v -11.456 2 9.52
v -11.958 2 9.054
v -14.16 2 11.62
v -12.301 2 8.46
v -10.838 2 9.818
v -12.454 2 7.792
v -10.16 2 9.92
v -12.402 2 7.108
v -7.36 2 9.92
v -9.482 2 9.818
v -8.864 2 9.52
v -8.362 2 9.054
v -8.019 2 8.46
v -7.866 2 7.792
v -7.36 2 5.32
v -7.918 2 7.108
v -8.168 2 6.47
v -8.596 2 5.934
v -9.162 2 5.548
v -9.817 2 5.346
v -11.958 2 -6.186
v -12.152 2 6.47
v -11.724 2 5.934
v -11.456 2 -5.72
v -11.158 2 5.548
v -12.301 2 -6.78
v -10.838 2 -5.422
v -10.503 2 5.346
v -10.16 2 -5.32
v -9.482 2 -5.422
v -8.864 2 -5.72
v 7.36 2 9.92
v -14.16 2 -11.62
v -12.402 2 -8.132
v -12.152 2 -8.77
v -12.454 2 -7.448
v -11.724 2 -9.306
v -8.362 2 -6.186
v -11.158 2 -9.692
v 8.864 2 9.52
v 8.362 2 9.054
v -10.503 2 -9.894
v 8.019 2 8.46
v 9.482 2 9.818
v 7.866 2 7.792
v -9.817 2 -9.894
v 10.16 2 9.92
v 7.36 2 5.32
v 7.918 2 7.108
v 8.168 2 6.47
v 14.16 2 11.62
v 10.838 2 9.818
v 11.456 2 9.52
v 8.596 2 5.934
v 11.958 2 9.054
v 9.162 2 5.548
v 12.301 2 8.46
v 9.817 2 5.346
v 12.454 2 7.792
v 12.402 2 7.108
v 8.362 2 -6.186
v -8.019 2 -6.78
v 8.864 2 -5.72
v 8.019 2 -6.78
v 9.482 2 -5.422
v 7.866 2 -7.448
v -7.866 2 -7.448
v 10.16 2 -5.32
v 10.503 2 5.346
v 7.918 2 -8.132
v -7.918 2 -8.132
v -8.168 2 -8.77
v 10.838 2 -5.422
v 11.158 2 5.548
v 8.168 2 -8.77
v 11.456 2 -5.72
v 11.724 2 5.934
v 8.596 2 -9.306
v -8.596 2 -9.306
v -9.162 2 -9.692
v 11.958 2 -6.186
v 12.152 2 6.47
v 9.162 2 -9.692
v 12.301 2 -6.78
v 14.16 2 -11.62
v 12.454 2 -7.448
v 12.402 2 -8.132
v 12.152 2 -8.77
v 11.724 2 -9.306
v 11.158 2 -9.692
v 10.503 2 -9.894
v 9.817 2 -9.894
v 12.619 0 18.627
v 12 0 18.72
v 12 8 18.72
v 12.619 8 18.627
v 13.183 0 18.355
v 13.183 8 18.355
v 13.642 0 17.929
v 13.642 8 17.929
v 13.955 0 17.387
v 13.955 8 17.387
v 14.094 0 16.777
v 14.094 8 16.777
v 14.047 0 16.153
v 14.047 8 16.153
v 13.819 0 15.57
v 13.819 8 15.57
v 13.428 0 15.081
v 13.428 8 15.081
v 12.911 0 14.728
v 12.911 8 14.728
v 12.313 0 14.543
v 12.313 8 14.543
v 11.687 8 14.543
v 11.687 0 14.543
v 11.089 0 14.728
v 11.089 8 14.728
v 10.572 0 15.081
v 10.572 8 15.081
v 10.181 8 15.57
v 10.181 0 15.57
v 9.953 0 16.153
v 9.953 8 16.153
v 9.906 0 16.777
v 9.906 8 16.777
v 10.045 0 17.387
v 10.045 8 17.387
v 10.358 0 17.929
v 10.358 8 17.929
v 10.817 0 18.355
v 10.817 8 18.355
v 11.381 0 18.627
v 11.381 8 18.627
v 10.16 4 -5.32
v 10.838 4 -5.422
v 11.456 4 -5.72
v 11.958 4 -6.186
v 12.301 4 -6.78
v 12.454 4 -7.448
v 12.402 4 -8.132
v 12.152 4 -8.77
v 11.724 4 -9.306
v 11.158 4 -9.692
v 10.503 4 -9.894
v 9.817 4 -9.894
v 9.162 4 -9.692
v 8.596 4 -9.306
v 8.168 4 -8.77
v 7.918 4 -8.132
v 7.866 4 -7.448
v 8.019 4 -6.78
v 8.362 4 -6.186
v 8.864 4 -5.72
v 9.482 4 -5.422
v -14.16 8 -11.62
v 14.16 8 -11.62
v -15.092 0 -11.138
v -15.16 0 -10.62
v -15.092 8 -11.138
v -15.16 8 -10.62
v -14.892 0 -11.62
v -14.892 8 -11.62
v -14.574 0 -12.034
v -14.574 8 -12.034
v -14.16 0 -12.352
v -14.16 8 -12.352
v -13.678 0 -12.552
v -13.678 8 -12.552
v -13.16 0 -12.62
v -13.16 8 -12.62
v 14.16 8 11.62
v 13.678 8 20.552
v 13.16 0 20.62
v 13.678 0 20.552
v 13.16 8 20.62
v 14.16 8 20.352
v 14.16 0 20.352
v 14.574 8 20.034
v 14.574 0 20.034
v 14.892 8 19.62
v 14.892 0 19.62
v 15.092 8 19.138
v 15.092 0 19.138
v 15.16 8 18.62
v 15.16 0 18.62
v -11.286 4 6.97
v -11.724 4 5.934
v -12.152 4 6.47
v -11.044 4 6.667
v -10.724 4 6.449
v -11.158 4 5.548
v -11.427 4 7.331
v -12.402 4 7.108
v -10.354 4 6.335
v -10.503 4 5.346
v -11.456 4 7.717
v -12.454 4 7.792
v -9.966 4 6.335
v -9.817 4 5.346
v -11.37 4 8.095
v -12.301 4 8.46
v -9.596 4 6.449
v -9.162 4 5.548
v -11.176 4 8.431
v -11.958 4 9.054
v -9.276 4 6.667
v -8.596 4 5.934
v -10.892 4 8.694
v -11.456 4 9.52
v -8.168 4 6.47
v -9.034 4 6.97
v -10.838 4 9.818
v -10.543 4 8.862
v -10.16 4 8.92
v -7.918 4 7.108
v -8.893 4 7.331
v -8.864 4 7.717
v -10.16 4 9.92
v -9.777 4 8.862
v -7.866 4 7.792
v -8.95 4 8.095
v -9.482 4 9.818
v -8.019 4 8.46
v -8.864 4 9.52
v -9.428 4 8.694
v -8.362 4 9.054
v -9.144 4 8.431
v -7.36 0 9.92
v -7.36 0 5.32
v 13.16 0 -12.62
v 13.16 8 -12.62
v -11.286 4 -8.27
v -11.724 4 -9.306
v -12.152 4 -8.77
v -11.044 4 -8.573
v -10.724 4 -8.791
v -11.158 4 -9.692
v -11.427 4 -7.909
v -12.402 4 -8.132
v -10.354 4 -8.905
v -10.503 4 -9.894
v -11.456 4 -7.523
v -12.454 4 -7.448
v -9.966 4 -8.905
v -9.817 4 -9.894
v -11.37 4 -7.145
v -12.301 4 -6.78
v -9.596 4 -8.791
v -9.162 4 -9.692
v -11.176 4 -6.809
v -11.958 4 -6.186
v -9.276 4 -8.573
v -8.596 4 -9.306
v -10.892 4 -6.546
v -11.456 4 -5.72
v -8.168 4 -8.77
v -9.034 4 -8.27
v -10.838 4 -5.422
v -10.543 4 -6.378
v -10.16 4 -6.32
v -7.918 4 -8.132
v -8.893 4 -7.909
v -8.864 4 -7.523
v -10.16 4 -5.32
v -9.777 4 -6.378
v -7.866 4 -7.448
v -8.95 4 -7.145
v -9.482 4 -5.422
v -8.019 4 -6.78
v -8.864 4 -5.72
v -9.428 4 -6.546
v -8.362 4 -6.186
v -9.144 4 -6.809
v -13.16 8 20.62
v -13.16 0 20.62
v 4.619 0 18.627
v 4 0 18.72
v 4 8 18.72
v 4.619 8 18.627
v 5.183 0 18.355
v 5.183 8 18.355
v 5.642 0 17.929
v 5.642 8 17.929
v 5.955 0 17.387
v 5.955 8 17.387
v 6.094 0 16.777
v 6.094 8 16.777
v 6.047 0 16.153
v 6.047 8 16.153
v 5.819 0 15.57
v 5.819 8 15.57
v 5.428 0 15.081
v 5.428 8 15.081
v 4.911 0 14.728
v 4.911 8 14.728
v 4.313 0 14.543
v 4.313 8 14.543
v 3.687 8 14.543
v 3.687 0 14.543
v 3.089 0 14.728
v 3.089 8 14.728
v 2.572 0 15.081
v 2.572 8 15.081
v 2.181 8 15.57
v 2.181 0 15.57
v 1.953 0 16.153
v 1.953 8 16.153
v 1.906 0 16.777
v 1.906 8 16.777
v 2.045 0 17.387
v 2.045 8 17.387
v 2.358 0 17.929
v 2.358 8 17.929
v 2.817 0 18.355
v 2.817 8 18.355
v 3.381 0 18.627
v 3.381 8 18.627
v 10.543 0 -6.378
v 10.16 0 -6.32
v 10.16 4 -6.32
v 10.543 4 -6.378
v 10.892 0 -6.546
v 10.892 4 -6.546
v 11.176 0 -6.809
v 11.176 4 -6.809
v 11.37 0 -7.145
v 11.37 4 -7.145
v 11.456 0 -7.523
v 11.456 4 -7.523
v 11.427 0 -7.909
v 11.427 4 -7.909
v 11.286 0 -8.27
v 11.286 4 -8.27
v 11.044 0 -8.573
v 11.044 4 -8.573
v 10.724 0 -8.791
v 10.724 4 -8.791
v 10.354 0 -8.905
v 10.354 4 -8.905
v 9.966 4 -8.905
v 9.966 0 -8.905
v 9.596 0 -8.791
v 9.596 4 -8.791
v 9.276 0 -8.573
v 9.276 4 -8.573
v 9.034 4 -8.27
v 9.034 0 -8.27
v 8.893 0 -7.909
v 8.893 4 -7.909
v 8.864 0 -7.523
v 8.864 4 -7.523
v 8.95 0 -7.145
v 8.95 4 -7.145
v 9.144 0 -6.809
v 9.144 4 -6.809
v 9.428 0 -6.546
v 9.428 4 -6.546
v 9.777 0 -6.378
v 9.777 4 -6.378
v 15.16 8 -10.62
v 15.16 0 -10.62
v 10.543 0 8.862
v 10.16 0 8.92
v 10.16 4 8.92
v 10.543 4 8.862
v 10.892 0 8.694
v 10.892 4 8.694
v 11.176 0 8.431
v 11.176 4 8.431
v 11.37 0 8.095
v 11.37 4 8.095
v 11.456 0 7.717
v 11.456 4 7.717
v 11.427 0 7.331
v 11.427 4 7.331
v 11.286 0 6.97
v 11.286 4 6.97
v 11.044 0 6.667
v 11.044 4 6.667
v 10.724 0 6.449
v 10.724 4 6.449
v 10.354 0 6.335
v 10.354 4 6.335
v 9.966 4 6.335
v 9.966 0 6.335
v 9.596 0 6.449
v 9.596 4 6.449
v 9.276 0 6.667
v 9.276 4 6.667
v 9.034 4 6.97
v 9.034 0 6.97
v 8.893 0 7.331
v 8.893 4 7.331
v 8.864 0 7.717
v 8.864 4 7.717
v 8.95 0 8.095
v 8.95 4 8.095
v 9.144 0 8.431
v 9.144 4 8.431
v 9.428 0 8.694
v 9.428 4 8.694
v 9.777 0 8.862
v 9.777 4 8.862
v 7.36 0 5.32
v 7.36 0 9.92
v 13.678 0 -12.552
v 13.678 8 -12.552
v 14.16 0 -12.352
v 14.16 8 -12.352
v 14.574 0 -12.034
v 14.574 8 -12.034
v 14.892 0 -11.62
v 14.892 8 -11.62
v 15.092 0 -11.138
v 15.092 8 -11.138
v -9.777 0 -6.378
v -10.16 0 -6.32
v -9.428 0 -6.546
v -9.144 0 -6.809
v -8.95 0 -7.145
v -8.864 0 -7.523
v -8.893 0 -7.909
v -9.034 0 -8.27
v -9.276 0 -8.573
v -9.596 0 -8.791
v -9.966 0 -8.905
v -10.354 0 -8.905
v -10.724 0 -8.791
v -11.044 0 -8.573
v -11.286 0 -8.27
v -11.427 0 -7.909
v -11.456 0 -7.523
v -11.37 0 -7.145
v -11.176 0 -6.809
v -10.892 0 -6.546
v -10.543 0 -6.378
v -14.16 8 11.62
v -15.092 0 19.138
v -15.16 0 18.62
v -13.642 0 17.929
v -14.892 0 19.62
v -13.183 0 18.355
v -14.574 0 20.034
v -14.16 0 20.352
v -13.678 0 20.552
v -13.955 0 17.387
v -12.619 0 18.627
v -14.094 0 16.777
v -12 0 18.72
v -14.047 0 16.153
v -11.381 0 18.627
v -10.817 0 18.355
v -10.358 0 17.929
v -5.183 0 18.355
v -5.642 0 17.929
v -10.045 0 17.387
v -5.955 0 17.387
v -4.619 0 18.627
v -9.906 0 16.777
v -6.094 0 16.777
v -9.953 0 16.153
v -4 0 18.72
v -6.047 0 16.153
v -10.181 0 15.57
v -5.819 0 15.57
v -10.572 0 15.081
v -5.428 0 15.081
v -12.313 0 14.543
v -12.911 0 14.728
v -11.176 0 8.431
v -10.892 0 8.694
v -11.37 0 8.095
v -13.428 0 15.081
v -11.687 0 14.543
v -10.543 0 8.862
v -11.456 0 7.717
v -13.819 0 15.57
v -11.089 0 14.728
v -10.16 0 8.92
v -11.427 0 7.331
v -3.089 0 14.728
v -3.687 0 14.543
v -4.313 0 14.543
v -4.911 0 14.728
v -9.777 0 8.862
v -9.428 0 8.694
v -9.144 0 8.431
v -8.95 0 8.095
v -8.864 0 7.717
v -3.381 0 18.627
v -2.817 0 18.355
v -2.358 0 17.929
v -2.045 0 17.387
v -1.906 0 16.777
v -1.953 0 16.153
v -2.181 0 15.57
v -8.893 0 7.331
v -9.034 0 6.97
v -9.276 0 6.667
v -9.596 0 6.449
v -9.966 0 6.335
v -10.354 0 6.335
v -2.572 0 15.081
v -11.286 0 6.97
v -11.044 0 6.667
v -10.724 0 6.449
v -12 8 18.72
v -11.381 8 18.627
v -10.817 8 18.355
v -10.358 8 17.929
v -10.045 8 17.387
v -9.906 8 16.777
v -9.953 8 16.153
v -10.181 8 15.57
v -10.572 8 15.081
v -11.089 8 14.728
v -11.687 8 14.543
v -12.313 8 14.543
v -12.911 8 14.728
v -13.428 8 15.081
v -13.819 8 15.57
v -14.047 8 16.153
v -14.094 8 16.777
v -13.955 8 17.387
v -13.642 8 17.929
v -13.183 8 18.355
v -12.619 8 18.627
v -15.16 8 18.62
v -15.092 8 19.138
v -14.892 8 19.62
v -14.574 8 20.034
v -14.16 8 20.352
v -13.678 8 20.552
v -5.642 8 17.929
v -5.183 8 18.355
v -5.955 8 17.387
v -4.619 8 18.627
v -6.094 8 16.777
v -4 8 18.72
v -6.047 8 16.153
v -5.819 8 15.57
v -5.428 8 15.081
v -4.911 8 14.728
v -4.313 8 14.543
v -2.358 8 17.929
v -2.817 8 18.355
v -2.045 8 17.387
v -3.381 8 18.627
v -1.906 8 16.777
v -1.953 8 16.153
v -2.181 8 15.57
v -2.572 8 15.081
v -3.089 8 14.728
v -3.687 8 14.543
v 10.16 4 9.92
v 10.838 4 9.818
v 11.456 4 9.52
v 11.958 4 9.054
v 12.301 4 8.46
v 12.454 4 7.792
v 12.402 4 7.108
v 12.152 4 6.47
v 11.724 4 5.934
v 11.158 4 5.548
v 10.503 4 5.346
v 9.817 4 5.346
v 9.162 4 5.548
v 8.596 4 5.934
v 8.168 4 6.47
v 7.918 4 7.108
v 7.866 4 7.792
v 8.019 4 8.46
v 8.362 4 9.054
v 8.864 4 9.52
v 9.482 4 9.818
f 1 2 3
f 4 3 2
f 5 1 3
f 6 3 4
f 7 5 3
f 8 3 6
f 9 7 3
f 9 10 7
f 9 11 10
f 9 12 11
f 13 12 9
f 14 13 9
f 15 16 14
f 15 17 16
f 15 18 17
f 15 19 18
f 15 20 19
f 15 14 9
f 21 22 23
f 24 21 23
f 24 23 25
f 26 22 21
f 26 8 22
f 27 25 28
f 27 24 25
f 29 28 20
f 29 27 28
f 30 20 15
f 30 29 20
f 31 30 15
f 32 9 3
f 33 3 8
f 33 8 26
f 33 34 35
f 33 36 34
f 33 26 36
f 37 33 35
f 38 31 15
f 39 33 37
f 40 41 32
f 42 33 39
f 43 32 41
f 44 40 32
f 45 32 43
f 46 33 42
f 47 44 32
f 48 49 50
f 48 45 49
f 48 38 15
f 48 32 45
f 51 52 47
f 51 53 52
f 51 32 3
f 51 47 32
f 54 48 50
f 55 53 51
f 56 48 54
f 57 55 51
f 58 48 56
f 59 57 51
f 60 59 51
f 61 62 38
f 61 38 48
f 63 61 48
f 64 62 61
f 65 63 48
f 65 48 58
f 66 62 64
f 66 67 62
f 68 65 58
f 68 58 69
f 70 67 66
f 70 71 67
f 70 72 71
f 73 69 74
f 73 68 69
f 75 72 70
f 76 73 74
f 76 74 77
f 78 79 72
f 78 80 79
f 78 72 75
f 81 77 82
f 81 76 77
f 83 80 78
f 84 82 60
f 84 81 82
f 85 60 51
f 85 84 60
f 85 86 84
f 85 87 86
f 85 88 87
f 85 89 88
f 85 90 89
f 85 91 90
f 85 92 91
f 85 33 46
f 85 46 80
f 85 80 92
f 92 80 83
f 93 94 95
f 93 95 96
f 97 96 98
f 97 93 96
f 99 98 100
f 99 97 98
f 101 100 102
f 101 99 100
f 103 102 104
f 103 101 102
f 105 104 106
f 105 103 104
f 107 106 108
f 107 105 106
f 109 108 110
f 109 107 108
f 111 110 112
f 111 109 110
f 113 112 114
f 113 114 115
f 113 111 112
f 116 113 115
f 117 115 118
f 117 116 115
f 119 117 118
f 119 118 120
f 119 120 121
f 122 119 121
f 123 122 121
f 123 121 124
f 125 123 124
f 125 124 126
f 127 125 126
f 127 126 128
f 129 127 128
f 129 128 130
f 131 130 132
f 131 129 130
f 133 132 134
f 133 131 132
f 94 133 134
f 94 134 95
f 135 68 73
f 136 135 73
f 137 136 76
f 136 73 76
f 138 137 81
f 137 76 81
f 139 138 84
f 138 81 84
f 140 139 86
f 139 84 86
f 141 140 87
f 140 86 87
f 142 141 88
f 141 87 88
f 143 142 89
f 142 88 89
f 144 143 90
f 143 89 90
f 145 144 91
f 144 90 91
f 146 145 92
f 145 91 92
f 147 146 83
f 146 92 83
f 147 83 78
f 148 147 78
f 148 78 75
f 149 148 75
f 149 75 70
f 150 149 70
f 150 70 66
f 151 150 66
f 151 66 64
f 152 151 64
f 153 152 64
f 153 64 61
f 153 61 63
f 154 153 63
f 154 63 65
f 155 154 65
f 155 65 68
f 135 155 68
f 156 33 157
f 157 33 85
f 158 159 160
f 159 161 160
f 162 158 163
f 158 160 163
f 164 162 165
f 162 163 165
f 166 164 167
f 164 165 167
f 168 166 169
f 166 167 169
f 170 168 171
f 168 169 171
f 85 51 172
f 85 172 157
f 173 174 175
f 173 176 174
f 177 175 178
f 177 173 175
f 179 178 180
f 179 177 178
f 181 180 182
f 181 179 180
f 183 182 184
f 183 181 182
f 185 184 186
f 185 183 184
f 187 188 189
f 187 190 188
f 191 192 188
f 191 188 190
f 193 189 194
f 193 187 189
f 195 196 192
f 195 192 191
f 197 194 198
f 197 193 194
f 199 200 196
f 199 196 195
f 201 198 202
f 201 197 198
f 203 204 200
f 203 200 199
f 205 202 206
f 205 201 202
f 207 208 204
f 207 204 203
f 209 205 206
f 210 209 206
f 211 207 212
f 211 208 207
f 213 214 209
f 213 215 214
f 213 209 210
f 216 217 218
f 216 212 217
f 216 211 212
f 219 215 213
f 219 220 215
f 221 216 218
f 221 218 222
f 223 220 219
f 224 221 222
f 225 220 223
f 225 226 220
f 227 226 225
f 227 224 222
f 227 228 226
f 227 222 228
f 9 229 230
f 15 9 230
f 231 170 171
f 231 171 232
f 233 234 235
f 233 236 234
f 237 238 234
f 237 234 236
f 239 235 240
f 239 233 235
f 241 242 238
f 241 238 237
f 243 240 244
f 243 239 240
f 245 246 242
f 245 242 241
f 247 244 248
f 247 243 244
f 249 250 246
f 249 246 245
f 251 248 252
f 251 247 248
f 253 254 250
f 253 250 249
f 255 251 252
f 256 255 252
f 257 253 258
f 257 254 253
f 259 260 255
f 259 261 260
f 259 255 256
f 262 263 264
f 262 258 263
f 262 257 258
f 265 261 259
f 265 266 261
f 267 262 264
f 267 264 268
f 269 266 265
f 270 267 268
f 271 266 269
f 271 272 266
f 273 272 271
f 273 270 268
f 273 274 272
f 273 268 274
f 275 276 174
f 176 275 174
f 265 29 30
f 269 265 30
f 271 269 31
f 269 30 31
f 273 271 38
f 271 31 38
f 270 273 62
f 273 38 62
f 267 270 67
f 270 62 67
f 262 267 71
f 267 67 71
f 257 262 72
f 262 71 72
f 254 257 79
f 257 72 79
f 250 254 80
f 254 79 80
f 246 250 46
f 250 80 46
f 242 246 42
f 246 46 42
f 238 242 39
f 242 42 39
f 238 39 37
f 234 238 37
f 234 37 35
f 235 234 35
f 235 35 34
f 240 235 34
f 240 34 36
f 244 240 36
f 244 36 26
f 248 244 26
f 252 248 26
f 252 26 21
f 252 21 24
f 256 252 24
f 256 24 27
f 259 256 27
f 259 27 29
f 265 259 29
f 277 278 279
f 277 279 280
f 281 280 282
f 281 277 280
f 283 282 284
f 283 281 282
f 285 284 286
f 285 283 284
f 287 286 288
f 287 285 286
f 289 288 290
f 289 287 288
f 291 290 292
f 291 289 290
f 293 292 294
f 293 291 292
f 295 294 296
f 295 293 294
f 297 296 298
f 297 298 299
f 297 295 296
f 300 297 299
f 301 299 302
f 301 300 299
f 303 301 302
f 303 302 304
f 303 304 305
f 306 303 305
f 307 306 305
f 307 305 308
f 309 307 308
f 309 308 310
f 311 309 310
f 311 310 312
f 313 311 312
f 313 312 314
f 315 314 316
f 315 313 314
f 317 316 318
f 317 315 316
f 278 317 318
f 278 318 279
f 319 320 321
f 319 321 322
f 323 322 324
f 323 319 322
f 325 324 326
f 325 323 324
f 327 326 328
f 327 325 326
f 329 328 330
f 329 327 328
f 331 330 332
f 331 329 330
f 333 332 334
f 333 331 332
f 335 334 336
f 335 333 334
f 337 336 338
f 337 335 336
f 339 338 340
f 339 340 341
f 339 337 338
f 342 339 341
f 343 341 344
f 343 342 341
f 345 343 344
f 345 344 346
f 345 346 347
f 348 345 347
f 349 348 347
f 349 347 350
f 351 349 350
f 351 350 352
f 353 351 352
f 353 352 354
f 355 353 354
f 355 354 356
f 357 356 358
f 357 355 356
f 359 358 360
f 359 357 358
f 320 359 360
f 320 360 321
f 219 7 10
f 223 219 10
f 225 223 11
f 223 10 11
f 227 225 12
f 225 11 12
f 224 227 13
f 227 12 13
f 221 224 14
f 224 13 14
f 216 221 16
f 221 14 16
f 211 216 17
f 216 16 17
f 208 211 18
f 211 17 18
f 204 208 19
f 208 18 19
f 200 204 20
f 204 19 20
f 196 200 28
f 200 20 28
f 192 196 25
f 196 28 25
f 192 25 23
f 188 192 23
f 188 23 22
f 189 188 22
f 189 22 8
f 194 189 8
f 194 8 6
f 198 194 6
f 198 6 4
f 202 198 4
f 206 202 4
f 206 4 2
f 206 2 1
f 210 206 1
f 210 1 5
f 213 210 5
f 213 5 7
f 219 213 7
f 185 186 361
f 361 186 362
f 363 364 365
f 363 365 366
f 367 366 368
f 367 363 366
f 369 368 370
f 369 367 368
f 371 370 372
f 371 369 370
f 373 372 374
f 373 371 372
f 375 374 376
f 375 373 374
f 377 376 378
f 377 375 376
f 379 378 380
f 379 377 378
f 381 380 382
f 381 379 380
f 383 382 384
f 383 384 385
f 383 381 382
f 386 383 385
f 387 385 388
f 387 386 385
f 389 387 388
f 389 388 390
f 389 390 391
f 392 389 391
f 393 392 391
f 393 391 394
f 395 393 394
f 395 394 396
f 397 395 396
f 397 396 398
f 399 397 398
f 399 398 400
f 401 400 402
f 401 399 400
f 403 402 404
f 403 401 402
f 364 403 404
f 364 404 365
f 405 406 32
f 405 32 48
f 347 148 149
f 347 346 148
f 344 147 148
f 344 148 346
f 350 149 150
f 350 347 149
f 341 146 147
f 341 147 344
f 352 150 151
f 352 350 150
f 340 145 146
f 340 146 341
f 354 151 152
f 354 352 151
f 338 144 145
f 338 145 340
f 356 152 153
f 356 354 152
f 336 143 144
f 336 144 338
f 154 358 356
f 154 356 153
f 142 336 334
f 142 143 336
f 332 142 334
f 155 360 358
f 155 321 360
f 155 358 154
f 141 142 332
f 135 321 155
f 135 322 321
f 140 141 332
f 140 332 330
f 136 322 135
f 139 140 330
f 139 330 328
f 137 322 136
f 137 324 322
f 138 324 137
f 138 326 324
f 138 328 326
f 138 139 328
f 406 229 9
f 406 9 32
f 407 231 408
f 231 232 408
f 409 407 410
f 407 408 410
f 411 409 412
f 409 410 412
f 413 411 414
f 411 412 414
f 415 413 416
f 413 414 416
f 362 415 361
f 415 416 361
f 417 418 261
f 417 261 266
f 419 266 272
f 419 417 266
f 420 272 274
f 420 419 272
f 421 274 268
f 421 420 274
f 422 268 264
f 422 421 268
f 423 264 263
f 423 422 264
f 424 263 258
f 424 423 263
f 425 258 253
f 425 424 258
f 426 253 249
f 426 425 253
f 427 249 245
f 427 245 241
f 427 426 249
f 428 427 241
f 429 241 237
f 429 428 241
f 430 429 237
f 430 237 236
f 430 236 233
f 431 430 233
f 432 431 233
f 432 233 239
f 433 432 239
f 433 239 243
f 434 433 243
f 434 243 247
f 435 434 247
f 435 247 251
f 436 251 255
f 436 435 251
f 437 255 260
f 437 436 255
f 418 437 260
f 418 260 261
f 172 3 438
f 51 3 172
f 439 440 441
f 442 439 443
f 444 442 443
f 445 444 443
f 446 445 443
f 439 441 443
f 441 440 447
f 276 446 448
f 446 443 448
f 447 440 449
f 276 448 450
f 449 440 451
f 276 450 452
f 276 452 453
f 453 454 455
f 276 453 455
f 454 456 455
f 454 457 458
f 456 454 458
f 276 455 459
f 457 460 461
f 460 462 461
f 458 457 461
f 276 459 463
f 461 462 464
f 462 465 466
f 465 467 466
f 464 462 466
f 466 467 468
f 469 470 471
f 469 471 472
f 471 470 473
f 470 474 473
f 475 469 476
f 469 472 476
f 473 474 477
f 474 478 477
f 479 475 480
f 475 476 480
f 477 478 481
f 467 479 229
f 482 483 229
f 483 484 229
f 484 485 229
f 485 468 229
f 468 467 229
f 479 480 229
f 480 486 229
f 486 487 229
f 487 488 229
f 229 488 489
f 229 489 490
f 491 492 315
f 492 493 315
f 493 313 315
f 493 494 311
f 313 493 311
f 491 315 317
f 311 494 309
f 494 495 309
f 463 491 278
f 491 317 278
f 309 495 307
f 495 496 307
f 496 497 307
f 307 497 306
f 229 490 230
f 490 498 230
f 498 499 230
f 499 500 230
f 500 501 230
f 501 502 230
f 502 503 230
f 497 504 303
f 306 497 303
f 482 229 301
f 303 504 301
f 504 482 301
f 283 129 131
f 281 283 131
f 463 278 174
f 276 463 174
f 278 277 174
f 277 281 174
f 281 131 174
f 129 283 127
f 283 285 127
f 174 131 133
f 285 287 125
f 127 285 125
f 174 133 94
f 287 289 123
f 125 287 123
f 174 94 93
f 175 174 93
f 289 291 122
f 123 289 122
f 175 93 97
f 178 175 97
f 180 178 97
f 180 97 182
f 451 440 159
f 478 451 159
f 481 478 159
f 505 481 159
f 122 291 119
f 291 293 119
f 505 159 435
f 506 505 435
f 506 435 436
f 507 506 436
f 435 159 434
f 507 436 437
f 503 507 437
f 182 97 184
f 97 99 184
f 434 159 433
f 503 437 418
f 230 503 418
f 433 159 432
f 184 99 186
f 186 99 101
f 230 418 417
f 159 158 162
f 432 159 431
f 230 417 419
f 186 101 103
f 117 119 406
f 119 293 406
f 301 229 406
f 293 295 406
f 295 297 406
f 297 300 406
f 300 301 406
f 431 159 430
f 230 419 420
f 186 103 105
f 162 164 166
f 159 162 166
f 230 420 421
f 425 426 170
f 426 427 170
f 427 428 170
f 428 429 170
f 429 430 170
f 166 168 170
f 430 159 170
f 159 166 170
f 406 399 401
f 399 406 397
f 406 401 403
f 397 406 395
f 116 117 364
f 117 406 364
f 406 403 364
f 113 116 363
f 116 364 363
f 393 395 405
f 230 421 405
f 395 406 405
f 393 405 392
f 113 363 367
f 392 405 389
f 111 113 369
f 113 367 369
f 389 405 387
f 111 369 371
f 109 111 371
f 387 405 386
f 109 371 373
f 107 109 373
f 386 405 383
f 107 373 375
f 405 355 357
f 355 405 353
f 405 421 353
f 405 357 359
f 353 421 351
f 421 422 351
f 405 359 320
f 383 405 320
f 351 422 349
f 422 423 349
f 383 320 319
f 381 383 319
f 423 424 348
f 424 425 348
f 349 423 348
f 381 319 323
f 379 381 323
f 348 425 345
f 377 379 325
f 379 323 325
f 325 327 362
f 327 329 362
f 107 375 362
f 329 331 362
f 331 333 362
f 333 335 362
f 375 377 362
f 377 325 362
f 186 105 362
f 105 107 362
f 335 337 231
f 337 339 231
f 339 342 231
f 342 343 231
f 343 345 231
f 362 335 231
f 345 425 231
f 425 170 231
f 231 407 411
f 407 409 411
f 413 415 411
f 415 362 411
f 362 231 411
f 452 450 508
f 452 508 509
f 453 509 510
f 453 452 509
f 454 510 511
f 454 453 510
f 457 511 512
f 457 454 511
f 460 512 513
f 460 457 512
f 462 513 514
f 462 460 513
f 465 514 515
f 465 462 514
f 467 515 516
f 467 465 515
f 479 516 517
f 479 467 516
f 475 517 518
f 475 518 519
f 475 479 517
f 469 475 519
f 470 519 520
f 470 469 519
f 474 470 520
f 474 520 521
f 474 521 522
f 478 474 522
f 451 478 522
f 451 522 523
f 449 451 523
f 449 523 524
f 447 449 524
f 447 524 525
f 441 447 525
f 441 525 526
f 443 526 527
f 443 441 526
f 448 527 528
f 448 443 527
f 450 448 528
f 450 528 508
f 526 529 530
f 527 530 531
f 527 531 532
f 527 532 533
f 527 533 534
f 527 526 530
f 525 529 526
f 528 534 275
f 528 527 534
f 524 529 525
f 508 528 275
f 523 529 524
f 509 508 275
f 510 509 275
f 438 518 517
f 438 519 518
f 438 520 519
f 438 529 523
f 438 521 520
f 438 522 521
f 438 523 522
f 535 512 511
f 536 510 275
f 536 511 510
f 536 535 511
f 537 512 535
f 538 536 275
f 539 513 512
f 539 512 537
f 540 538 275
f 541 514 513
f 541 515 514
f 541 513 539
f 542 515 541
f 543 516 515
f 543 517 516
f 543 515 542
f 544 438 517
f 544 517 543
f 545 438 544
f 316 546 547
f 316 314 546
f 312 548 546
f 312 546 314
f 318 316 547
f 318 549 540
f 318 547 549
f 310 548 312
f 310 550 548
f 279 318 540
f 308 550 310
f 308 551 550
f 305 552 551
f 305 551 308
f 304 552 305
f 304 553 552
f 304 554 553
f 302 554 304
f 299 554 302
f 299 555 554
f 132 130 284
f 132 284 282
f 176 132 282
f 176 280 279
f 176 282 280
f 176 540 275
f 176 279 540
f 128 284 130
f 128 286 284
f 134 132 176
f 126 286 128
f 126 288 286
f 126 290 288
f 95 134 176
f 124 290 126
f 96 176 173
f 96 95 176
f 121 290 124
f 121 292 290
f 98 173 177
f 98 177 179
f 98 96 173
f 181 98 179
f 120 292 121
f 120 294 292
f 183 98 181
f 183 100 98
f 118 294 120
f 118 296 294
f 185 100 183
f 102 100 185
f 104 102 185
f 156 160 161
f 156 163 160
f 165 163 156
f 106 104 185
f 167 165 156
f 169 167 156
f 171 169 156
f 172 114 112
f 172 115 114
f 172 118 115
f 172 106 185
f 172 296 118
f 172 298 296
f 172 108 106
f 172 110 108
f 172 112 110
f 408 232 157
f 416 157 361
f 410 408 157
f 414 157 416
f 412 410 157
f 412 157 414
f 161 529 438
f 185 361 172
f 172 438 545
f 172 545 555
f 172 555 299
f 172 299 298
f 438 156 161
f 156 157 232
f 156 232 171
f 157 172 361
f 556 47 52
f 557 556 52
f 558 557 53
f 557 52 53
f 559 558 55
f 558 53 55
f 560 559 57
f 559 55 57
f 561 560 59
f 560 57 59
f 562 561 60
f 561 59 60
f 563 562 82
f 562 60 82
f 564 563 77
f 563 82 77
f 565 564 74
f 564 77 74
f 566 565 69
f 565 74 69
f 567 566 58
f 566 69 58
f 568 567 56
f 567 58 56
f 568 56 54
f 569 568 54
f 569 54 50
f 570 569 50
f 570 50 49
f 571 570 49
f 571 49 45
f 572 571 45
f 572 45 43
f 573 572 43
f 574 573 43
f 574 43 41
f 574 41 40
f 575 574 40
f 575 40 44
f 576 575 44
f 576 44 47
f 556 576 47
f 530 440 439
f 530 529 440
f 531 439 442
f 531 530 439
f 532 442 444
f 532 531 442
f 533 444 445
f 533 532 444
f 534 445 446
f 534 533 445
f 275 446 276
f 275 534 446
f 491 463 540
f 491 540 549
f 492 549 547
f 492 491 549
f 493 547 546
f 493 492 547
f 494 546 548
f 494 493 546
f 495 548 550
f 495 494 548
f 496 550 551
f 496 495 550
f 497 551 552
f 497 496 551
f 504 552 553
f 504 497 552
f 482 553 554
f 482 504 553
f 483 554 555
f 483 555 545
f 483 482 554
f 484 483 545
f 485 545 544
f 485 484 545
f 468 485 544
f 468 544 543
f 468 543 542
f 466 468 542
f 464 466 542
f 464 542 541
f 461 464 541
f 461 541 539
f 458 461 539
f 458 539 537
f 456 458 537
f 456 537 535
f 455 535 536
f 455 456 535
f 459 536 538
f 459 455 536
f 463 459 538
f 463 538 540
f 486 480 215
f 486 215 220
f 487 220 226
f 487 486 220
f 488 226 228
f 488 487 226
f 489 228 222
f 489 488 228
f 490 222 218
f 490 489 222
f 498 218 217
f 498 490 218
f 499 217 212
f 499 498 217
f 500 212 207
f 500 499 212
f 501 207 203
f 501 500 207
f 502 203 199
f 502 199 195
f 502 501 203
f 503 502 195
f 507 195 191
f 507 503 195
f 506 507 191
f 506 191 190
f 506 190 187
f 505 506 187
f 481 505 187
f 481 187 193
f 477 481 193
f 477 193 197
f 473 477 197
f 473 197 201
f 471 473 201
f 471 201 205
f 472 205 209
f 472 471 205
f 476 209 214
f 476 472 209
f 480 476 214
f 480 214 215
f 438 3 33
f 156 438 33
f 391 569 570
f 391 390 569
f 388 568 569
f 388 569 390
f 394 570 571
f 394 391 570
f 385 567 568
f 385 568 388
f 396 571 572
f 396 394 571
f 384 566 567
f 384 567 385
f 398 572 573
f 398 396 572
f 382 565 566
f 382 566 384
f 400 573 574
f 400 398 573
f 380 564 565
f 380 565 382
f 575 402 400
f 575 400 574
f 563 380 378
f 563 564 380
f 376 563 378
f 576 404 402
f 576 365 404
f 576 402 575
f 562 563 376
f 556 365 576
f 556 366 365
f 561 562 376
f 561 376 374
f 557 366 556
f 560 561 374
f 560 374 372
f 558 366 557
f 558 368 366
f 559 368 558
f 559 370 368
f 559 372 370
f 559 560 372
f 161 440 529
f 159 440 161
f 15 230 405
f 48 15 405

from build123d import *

# Parameters (mm, degrees)
SKETCH1_W           = 28.32
SKETCH1_H           = 23.24
SKETCH1_R           = 2.3
SKETCH1_W_2         = 14.72
SKETCH1_H_2         = 4.6
BOSS_EXTRUDE1_DEPTH = 2
SKETCH1_3_R         = 2.3
SKETCH1_3_R_2       = 1.3
BOSS_EXTRUDE2_DEPTH = 4
SKETCH1_4_R         = 2.1
SKETCH1_4_W         = 28.32
SKETCH1_4_H         = 23.24
BOSS_EXTRUDE3_DEPTH = 8
FILLET2_R           = 2


with BuildPart() as part:
    # Sketch1 → Boss-Extrude1 (new body)
    with BuildSketch(Plane(origin=(0, 0, 0), x_dir=(1, 0, 0), z_dir=(0, 1, 0))):
        Rectangle(SKETCH1_W, SKETCH1_H)
        with Locations((-10.16, -7.62)):
            Circle(SKETCH1_R, mode=Mode.SUBTRACT)
        with Locations((0, -7.62)):
            Rectangle(SKETCH1_W_2, SKETCH1_H_2, mode=Mode.SUBTRACT)
        with Locations((10.16, -7.62)):
            Circle(SKETCH1_R, mode=Mode.SUBTRACT)
        with Locations((-10.16, 7.62)):
            Circle(SKETCH1_R, mode=Mode.SUBTRACT)
        with Locations((10.16, 7.62)):
            Circle(SKETCH1_R, mode=Mode.SUBTRACT)
    extrude(amount=BOSS_EXTRUDE1_DEPTH)

    # Sketch1<3> → Boss-Extrude2 (add)
    # profile 1 of 4: a face of its own
    with BuildSketch(Plane(origin=(0, 0, 0), x_dir=(1, 0, 0), z_dir=(0, 1, 0))):
        with Locations((-10.16, 7.62)):
            Circle(SKETCH1_3_R)
        with Locations((-10.16, 7.62)):
            Circle(SKETCH1_3_R_2, mode=Mode.SUBTRACT)
    # profile 2 of 4: a face of its own
    with BuildSketch(Plane(origin=(0, 0, 0), x_dir=(1, 0, 0), z_dir=(0, 1, 0))):
        with Locations((-10.16, -7.62)):
            Circle(SKETCH1_3_R)
        with Locations((-10.16, -7.62)):
            Circle(SKETCH1_3_R_2, mode=Mode.SUBTRACT)
    # profile 3 of 4: a face of its own
    with BuildSketch(Plane(origin=(0, 0, 0), x_dir=(1, 0, 0), z_dir=(0, 1, 0))):
        with Locations((10.16, 7.62)):
            Circle(SKETCH1_3_R)
        with Locations((10.16, 7.62)):
            Circle(SKETCH1_3_R_2, mode=Mode.SUBTRACT)
    # profile 4 of 4: a face of its own
    with BuildSketch(Plane(origin=(0, 0, 0), x_dir=(1, 0, 0), z_dir=(0, 1, 0))):
        with Locations((10.16, -7.62)):
            Circle(SKETCH1_3_R)
        with Locations((10.16, -7.62)):
            Circle(SKETCH1_3_R_2, mode=Mode.SUBTRACT)
    extrude(amount=BOSS_EXTRUDE2_DEPTH)

    # Sketch1<4> → Boss-Extrude3 (add)
    with BuildSketch(Plane(origin=(0, 0, 0), x_dir=(1, 0, 0), z_dir=(0, 1, 0))):
        Polygon((15.16, -12.62), (15.16, 12.62), (-15.16, 12.62), (-15.16, -12.62), (-15.16, -20.62), (15.16, -20.62), align=None)
        with Locations((-12, -16.62)):
            Circle(SKETCH1_4_R, mode=Mode.SUBTRACT)
        with Locations((-4, -16.62)):
            Circle(SKETCH1_4_R, mode=Mode.SUBTRACT)
        with Locations((4, -16.62)):
            Circle(SKETCH1_4_R, mode=Mode.SUBTRACT)
        with Locations((12, -16.62)):
            Circle(SKETCH1_4_R, mode=Mode.SUBTRACT)
        Rectangle(SKETCH1_4_W, SKETCH1_4_H, mode=Mode.SUBTRACT)
    extrude(amount=BOSS_EXTRUDE3_DEPTH)

    # Fillet2
    fillet2_edges = [part.edges().sort_by_distance(p)[0] for p in [
        (15.16, 4, 20.62),
        (15.16, 4, -12.62),
        (-15.16, 4, -12.62),
        (-15.16, 4, 20.62),
    ]]
    fillet(fillet2_edges, radius=FILLET2_R)


solid = part.part
